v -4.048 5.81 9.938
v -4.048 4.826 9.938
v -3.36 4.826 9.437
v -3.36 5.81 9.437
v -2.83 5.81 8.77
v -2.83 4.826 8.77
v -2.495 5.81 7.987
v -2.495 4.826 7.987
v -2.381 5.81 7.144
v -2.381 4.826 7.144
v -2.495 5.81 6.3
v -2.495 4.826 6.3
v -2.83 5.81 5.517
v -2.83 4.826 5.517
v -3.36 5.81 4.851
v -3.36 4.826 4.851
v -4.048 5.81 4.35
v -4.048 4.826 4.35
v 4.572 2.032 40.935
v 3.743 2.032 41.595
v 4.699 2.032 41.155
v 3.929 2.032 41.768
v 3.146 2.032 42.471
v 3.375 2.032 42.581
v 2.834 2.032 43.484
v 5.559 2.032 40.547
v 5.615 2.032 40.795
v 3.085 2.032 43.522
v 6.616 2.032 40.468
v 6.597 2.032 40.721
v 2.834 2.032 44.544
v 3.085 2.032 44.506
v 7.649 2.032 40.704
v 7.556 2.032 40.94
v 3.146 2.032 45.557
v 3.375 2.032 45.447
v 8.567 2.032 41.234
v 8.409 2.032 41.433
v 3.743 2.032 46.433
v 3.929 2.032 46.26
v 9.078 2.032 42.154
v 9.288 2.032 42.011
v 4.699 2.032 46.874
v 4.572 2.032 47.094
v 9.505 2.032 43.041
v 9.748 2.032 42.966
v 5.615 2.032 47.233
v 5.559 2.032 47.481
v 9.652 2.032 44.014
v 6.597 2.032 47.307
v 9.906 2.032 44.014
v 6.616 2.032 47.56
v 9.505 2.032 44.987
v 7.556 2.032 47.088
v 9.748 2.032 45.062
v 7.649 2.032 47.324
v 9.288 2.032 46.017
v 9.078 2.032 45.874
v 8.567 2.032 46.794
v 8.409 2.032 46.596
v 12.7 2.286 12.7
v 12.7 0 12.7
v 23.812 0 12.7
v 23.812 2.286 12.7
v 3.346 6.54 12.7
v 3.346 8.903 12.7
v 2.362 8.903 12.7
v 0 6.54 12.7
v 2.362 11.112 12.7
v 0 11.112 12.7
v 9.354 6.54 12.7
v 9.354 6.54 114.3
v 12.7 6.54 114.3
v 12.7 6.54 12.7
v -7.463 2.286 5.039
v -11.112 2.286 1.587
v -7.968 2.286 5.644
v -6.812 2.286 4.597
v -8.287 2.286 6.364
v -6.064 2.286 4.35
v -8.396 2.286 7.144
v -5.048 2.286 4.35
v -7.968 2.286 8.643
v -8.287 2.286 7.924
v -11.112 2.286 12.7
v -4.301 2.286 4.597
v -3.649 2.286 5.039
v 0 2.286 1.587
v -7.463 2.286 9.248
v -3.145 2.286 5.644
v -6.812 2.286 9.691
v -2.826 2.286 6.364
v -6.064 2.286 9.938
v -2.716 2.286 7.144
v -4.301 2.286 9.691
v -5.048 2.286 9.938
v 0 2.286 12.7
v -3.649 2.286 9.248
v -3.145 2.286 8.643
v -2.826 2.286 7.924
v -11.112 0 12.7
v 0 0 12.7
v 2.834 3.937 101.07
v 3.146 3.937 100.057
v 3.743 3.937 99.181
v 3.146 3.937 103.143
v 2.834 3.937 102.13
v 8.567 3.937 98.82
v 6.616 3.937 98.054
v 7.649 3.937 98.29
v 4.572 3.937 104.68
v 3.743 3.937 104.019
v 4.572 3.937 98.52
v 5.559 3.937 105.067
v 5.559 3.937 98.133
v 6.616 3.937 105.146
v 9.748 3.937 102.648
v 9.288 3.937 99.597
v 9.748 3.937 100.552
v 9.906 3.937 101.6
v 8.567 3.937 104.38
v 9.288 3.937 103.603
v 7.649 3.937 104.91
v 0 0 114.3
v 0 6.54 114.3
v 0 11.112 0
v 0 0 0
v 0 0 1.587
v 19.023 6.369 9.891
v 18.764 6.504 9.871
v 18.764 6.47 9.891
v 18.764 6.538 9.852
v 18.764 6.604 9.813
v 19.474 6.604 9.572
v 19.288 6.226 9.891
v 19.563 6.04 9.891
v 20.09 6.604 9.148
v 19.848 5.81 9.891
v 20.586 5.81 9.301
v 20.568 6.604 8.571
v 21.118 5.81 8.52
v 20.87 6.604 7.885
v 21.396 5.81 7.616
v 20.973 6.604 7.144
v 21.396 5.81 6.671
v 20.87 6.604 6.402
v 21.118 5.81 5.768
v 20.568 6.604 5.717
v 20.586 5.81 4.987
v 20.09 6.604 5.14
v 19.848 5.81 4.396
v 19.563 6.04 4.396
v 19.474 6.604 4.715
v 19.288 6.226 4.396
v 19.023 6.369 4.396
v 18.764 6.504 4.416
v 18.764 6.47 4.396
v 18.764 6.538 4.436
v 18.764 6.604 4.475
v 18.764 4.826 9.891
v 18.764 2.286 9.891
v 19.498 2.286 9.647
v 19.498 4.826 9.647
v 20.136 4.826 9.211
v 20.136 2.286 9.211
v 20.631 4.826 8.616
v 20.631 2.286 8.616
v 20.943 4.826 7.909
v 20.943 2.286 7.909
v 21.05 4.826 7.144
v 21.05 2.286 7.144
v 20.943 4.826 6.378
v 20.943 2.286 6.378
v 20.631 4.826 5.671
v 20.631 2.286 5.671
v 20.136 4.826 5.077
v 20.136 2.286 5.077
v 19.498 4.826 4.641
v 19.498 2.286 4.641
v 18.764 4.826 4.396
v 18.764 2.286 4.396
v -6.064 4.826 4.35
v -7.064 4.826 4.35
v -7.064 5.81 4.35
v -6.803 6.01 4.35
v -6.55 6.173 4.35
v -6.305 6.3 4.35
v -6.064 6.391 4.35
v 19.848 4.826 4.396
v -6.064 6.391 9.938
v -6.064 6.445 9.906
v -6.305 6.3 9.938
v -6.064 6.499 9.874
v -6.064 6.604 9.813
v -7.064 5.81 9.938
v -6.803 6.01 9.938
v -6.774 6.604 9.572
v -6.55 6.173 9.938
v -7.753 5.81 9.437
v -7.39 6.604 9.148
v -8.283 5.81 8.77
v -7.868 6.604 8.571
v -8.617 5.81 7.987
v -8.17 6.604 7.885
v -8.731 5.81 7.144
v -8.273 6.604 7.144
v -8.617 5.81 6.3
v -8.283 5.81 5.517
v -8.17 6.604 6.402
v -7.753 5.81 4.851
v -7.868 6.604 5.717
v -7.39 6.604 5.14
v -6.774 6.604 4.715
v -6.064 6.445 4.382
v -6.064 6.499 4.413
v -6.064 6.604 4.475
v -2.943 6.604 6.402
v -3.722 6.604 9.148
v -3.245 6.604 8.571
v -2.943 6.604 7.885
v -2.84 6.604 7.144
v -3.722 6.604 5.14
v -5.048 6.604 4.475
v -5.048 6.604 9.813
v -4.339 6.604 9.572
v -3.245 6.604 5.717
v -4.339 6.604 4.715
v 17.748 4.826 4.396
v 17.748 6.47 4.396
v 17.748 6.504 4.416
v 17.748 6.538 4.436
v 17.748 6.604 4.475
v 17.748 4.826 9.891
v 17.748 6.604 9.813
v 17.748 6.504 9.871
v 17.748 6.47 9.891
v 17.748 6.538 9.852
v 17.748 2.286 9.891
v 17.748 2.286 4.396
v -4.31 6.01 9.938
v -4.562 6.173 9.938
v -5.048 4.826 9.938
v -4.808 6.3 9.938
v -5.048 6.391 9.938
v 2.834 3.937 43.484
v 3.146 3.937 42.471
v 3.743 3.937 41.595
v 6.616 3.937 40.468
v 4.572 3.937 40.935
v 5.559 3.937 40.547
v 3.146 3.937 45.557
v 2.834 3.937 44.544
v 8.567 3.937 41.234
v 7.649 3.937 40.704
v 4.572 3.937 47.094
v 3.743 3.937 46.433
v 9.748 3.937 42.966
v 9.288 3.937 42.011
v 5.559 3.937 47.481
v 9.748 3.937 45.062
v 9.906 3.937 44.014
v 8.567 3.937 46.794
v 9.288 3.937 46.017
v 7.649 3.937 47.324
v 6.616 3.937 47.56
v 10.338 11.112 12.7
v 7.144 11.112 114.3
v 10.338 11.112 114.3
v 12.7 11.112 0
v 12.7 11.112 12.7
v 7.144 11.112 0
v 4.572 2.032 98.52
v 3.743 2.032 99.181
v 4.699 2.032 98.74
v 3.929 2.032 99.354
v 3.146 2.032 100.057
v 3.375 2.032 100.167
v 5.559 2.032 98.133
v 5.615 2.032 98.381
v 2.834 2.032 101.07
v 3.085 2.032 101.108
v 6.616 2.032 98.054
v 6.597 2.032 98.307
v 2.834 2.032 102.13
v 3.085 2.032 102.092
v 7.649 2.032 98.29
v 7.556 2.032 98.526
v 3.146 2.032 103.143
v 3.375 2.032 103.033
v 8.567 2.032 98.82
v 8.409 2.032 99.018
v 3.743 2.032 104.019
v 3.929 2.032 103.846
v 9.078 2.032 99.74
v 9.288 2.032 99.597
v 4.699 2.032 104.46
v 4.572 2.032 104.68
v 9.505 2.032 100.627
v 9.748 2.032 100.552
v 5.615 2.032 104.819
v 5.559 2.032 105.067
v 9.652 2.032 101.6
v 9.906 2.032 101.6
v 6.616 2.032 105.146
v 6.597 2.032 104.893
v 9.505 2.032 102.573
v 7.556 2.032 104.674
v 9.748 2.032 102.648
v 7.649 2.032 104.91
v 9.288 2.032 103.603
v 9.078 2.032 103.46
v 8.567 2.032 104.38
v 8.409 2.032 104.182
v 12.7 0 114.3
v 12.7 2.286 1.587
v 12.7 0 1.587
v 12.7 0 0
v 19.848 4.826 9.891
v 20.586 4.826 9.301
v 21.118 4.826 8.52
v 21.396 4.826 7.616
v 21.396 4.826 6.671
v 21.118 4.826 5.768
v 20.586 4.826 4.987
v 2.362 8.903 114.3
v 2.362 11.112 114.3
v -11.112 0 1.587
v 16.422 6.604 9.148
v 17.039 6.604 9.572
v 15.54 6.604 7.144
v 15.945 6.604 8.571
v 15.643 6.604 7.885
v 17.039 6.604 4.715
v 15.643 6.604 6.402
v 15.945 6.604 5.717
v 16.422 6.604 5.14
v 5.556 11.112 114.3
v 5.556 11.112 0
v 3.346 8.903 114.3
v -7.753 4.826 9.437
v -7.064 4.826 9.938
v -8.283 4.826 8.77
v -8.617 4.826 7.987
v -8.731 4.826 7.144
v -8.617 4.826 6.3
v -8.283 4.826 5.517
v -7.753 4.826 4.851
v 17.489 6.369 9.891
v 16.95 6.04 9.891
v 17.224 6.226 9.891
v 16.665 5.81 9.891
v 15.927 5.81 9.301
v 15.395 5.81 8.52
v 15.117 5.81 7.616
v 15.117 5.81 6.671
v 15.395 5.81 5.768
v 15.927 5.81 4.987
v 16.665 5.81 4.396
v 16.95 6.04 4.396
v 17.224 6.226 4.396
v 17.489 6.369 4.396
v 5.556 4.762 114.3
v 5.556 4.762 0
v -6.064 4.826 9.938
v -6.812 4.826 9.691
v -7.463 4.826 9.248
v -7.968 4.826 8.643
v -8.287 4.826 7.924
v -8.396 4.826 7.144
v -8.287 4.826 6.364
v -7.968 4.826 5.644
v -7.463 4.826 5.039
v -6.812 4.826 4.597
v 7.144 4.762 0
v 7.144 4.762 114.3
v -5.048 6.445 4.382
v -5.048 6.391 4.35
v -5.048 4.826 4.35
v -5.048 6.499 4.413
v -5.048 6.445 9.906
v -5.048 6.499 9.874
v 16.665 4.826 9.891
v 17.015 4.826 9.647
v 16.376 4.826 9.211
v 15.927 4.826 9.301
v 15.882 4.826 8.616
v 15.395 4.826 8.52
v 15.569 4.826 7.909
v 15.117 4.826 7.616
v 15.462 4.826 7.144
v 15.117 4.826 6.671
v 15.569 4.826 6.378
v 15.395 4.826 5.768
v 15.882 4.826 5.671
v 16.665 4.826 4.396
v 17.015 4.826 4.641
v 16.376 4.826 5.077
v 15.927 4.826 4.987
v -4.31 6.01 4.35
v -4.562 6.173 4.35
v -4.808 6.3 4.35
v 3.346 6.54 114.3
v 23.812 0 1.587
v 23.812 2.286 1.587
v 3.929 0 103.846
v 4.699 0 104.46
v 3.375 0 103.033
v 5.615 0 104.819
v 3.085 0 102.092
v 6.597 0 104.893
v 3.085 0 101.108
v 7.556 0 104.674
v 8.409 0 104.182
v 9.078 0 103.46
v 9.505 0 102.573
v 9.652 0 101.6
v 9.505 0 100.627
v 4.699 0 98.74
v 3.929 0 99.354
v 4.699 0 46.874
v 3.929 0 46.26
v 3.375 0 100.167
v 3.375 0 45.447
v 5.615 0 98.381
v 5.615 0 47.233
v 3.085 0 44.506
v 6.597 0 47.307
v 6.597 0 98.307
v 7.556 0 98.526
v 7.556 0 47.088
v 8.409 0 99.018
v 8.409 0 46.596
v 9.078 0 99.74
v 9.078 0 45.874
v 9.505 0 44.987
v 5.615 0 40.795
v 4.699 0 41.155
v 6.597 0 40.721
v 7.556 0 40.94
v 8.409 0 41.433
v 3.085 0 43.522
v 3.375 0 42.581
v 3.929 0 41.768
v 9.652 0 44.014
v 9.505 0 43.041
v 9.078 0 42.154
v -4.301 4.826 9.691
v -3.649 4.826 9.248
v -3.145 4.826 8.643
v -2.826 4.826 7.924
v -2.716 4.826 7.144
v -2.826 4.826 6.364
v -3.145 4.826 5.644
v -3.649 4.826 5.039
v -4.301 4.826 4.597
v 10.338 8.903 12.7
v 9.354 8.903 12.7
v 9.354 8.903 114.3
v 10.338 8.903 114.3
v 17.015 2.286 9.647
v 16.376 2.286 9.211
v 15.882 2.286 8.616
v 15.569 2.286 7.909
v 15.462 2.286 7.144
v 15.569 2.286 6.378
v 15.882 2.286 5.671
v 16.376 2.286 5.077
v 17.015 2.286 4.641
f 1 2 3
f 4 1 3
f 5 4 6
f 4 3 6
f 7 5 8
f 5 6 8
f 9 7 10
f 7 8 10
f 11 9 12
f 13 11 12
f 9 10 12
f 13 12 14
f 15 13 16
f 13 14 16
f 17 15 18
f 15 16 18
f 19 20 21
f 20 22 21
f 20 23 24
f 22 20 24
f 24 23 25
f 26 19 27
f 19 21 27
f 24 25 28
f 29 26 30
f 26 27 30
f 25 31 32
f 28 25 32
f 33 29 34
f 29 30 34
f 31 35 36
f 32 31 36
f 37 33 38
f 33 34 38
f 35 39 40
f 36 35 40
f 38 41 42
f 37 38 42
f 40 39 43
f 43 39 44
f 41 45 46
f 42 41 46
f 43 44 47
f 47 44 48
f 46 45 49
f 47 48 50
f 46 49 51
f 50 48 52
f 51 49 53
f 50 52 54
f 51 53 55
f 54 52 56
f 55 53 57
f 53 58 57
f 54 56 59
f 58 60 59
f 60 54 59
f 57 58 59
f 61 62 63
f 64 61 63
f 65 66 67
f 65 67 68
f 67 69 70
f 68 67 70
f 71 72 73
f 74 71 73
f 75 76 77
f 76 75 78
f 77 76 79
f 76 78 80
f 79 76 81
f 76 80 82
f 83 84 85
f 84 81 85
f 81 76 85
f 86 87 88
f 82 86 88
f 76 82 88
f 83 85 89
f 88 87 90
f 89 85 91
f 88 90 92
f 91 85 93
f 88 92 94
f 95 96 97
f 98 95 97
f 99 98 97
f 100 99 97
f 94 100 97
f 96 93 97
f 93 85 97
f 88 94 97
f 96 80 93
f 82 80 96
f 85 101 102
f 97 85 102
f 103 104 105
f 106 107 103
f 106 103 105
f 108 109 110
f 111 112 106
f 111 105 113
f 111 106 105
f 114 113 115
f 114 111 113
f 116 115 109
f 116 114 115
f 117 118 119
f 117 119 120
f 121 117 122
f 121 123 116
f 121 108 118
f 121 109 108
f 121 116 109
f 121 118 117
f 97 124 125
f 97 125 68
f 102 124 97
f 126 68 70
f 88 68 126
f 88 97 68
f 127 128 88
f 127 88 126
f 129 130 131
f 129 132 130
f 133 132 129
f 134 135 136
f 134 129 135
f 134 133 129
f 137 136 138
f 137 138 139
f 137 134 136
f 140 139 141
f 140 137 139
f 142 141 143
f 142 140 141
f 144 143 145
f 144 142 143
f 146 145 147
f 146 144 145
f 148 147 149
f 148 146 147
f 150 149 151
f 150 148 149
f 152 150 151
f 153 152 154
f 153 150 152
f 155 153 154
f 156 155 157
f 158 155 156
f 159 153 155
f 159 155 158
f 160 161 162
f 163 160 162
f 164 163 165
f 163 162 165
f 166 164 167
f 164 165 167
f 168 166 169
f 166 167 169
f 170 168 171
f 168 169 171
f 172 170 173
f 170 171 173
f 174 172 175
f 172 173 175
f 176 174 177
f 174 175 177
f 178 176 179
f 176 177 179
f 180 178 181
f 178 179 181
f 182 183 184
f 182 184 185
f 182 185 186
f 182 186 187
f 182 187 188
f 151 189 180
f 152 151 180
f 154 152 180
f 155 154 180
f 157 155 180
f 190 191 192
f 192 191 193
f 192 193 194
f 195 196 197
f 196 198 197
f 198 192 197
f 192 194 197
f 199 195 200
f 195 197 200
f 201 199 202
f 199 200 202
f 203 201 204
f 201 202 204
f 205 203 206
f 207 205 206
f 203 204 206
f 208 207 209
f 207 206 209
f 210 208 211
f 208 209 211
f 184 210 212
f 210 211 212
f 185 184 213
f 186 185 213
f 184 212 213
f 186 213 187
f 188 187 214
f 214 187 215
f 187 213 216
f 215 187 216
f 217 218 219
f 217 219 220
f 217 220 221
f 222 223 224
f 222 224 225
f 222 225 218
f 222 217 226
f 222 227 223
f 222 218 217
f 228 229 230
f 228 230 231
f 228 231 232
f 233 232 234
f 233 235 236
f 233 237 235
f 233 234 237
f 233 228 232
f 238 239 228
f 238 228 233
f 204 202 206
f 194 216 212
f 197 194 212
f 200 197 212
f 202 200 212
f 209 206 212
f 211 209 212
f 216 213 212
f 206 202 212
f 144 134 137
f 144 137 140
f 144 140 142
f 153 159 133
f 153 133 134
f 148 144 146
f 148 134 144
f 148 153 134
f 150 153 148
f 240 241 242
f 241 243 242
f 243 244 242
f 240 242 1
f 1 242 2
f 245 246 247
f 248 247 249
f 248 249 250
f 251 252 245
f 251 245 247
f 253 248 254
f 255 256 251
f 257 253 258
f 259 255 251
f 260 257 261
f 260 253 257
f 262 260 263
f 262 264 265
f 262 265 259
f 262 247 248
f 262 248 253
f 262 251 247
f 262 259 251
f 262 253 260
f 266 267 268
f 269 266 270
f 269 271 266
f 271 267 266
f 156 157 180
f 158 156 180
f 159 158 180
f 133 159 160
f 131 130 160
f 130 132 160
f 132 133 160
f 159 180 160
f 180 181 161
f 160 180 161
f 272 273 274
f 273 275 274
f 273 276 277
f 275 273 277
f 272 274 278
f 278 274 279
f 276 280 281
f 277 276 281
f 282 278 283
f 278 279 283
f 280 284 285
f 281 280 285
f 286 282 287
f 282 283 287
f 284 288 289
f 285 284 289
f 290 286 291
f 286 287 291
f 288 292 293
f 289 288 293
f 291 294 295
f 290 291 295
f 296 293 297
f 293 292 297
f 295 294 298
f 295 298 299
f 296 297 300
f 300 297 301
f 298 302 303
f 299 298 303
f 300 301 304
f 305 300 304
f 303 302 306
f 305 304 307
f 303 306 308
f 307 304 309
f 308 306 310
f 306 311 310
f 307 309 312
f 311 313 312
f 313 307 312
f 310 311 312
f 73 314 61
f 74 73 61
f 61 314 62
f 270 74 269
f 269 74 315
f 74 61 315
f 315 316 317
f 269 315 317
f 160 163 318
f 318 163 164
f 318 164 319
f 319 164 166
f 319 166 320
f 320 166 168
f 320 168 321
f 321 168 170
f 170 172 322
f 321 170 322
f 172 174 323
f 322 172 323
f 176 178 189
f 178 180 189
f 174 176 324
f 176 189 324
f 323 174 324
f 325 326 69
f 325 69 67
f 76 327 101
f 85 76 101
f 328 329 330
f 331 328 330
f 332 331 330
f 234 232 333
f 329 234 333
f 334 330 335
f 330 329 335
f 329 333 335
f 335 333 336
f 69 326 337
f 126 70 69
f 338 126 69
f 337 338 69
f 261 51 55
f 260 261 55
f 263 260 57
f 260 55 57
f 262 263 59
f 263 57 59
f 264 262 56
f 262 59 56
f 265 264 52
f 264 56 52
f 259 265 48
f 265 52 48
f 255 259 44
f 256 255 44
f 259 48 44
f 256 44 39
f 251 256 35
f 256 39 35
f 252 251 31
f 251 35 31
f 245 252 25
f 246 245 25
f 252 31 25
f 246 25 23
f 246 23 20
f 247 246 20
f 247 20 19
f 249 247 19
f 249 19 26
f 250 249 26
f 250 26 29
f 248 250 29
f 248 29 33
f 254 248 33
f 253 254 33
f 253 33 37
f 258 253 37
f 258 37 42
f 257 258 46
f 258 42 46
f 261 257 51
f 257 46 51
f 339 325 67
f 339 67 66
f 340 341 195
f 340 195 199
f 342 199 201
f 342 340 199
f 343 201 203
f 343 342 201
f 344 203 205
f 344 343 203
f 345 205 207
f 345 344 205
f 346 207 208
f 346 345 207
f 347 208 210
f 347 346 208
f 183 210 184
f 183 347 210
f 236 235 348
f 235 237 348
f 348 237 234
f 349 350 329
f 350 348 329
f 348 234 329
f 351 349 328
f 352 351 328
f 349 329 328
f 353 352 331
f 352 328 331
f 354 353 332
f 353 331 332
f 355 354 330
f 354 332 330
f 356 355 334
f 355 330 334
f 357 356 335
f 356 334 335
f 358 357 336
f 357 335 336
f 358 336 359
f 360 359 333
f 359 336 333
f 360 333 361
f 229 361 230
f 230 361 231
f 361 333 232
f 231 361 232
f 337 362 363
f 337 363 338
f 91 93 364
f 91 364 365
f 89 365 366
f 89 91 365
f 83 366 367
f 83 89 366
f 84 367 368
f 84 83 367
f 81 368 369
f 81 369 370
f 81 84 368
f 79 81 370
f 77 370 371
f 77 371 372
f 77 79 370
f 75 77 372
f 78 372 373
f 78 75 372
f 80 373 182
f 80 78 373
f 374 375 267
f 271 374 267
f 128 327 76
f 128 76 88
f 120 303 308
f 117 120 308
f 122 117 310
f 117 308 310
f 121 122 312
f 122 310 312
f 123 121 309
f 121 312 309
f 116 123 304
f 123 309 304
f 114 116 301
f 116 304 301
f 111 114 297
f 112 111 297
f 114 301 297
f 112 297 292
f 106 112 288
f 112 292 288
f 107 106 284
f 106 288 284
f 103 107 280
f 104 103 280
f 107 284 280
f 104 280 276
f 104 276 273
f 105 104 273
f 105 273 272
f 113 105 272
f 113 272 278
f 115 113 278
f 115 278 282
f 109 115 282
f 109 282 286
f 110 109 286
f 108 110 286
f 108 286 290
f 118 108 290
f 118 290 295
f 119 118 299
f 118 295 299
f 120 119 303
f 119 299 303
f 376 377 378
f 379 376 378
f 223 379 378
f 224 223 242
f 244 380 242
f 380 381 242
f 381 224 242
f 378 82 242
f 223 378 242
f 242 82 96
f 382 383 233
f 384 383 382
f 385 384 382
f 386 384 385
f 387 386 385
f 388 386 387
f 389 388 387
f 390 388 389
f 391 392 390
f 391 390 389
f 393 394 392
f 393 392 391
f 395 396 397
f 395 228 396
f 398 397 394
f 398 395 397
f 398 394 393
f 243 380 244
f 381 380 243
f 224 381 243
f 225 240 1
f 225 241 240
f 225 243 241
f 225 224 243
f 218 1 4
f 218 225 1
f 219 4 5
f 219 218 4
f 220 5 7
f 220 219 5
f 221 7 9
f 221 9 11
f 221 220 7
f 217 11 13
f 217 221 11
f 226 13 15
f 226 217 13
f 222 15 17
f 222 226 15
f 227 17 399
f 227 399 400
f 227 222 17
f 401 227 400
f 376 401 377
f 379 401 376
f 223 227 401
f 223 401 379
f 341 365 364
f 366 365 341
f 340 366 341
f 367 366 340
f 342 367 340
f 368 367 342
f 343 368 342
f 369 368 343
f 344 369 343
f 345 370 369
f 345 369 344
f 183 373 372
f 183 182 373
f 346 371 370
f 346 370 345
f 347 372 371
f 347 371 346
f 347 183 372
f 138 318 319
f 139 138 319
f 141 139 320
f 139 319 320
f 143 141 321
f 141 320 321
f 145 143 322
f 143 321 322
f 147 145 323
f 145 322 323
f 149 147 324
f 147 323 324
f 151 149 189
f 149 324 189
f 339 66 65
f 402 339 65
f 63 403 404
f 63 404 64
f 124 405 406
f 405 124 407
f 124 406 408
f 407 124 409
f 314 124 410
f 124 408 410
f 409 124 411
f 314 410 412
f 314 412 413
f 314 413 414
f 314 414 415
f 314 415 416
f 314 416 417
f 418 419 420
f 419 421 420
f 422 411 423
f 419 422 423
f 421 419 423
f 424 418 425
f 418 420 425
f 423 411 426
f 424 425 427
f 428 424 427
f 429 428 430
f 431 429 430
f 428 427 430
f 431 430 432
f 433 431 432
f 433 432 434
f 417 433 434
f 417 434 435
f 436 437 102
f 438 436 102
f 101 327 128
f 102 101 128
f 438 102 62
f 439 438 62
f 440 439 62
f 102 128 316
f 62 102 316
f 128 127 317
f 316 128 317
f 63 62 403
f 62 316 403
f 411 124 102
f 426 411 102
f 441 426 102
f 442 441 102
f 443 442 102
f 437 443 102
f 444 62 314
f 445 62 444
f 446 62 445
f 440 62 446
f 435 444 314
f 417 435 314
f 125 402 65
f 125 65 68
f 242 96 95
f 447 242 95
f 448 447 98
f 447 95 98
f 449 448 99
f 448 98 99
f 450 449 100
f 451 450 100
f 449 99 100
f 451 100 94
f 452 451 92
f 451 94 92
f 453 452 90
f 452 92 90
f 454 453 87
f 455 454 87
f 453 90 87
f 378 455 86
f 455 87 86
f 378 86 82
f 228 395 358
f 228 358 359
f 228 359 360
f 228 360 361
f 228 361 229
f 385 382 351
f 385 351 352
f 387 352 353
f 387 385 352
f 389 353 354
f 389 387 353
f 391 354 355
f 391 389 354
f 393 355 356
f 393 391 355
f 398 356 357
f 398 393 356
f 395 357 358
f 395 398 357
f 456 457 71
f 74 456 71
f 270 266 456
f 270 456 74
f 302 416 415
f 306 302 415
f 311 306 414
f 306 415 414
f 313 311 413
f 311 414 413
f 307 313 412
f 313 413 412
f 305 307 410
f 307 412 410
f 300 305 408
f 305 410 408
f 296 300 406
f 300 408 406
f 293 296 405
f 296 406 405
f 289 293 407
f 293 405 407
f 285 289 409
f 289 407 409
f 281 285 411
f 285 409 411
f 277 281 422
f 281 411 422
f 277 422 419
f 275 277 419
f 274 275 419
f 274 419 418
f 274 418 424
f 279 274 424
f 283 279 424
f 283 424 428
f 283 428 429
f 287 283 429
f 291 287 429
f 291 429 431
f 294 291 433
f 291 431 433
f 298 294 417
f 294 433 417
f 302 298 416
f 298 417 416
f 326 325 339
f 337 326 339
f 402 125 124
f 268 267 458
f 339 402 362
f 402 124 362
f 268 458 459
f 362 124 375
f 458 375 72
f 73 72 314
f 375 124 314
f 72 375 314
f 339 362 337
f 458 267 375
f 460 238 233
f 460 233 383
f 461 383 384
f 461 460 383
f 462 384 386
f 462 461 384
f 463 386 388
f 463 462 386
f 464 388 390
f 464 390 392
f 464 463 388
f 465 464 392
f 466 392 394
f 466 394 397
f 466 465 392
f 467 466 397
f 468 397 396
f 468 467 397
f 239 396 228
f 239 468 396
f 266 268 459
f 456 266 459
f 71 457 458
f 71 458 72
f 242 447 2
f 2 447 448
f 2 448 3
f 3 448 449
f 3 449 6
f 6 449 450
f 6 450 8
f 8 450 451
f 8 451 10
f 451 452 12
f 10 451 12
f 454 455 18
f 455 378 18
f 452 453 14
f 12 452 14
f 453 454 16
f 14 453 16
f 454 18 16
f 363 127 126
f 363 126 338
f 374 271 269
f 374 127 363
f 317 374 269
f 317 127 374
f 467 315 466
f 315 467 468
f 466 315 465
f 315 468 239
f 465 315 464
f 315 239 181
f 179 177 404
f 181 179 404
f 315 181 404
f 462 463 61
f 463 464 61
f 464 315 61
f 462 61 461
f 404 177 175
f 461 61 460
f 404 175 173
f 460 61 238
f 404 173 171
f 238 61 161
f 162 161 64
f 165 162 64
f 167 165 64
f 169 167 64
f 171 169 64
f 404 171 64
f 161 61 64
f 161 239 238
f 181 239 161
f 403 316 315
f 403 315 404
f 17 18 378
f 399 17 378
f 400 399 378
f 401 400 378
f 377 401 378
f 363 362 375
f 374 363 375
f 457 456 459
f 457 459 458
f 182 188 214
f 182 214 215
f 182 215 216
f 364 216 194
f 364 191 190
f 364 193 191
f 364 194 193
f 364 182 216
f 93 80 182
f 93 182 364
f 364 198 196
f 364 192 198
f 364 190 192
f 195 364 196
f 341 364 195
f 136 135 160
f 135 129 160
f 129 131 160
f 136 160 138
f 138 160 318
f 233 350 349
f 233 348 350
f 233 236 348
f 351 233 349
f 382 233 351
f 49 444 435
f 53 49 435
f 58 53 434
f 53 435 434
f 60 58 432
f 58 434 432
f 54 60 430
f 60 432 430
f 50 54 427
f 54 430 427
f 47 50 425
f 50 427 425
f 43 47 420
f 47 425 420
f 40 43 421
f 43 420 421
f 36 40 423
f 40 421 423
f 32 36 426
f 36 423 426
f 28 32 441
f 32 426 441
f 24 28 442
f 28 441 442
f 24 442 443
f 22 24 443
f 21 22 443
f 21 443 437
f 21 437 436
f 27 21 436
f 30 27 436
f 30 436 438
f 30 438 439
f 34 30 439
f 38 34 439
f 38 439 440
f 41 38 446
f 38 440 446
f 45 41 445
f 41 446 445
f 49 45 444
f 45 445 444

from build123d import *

# Parameters (mm, degrees)
SKETCH1_W             = 12.7
SKETCH1_H             = 114.3
BOSS_EXTRUDE1_DEPTH   = 11.1125
SKETCH2_W             = 1.5875
SKETCH2_H             = 6.35
CUT_EXTRUDE1_DEPTH    = 115.3
CUT_EXTRUDE2_DEPTH    = 101.6
SKETCH4_W             = 11.1125
SKETCH4_H             = 11.1125
BOSS_EXTRUDE2_DEPTH   = 2.286
BOSS_EXTRUDE3_DEPTH   = 2.54
BOSS_EXTRUDE5_DEPTH   = 1.778
CHAMFER1_SIZE         = 0.79375
CHAMFER1_SIZE2        = 0.458271776
CHAMFER1_PART_2_SIZE  = 0.79375
CHAMFER1_PART_2_SIZE2 = 0.458271776
CHAMFER1_PART_3_SIZE  = 0.79375
CHAMFER1_PART_3_SIZE2 = 0.458271776
CHAMFER1_PART_4_SIZE  = 0.79375
CHAMFER1_PART_4_SIZE2 = 0.458271776
SKETCH7_R             = 3.302
CUT_EXTRUDE3_DEPTH    = 2.032
SKETCH8_R             = 3.556
CUT_EXTRUDE4_DEPTH    = 1.905


with BuildPart() as part:
    # Sketch1 → Boss-Extrude1 (new body)
    with BuildSketch(Plane(origin=(0, 0, 0), x_dir=(1, 0, 0), z_dir=(0, 1, 0))):
        with Locations((6.35, -57.15)):
            Rectangle(SKETCH1_W, SKETCH1_H)
    extrude(amount=BOSS_EXTRUDE1_DEPTH)

    # Sketch2 → Cut-Extrude1 (cut, through all)
    with BuildSketch(Plane.XY.offset(114.3)):
        with Locations((6.35, 7.9375)):
            Rectangle(SKETCH2_W, SKETCH2_H)
    extrude(amount=-CUT_EXTRUDE1_DEPTH, mode=Mode.SUBTRACT)

    # Sketch3 → Cut-Extrude2 (cut)
    with BuildSketch(Plane.XY.offset(114.3)):
        Polygon((2.3622, 11.1125), (2.3622, 8.9027), (3.34645, 8.9027), (3.34645, 6.5405), (0, 6.5405), (0, 11.1125), align=None)
        Polygon((10.3378, 11.1125), (10.3378, 8.9027), (9.35355, 8.9027), (9.35355, 6.5405), (12.7, 6.5405), (12.7, 11.1125), align=None)
    extrude(amount=-CUT_EXTRUDE2_DEPTH, mode=Mode.SUBTRACT)

    # Sketch4 → Boss-Extrude2 (add)
    with BuildSketch(Plane.XZ):
        with Locations((-5.55625, 7.14375)):
            Rectangle(SKETCH4_W, SKETCH4_H)
        with Locations((18.25625, 7.14375)):
            Rectangle(SKETCH4_W, SKETCH4_H)
    extrude(amount=-BOSS_EXTRUDE2_DEPTH)

    # Sketch5 → Boss-Extrude3 (add)
    with BuildSketch(Plane(origin=(0, 2.286, 0), x_dir=(1, 0, 0), z_dir=(0, 1, 0))):
        with BuildLine():
            Line((18.76425, -4.396319928), (18.76425, -9.891180072))
            ThreePointArc((18.76425, -9.891180072), (21.05025, -7.14375), (18.76425, -4.396319928))
        make_face()
        with BuildLine():
            Line((-6.06425, -4.34975), (-6.06425, -9.93775))
            ThreePointArc((-6.06425, -9.93775), (-8.396056331, -7.14375), (-6.06425, -4.34975))
        make_face()
        with BuildLine():
            Line((17.74825, -4.396319928), (17.74825, -9.891180072))
            ThreePointArc((17.74825, -9.891180072), (15.46225, -7.14375), (17.74825, -4.396319928))
        make_face()
        with BuildLine():
            Line((-5.04825, -4.34975), (-5.04825, -9.93775))
            ThreePointArc((-5.04825, -9.93775), (-2.716443669, -7.14375), (-5.04825, -4.34975))
        make_face()
    extrude(amount=BOSS_EXTRUDE3_DEPTH)

    # Sketch6 → Boss-Extrude5 (add)
    with BuildSketch(Plane(origin=(0, 4.826, 0), x_dir=(1, 0, 0), z_dir=(0, 1, 0))):
        with BuildLine():
            Line((-7.064291445, -4.34975), (-6.06425, -4.34975))
            Line((-6.06425, -4.34975), (-6.06425, -9.93775))
            Line((-6.06425, -9.93775), (-7.064291445, -9.93775))
            ThreePointArc((-7.064291445, -9.93775), (-8.73125, -7.14375), (-7.064291445, -4.34975))
        make_face()
        with BuildLine():
            Line((-4.048208555, -4.34975), (-5.04825, -4.34975))
            Line((-5.04825, -4.34975), (-5.04825, -9.93775))
            Line((-5.04825, -9.93775), (-4.048208555, -9.93775))
            ThreePointArc((-4.048208555, -9.93775), (-2.38125, -7.14375), (-4.048208555, -4.34975))
        make_face()
        with BuildLine():
            Line((16.664944561, -4.396319928), (17.74825, -4.396319928))
            Line((17.74825, -4.396319928), (17.74825, -9.891180072))
            Line((17.74825, -9.891180072), (16.664944561, -9.891180072))
            ThreePointArc((16.664944561, -9.891180072), (15.08125, -7.14375), (16.664944561, -4.396319928))
        make_face()
        with BuildLine():
            Line((19.847555439, -4.396319928), (18.76425, -4.396319928))
            Line((18.76425, -4.396319928), (18.76425, -9.891180072))
            Line((18.76425, -9.891180072), (19.847555439, -9.891180072))
            ThreePointArc((19.847555439, -9.891180072), (21.43125, -7.14375), (19.847555439, -4.396319928))
        make_face()
    extrude(amount=BOSS_EXTRUDE5_DEPTH)

    # Chamfer1
    chamfer1_edges = [part.edges().sort_by_distance(p)[0] for p in [
        (21.43125, 6.604, 7.14375),
    ]]
    chamfer1_side = [part.faces().sort_by_distance(p)[0] for p in [
        (21.43125, 5.715, 7.14375),
    ]]
    chamfer(chamfer1_edges, length=CHAMFER1_SIZE, length2=CHAMFER1_SIZE2, reference=chamfer1_side[0])

    # Chamfer1 part 2
    chamfer1_part_2_edges = [part.edges().sort_by_distance(p)[0] for p in [
        (15.08125, 6.604, 7.14375),
    ]]
    chamfer1_part_2_side = [part.faces().sort_by_distance(p)[0] for p in [
        (15.08125, 5.715, 7.14375),
    ]]
    chamfer(chamfer1_part_2_edges, length=CHAMFER1_PART_2_SIZE, length2=CHAMFER1_PART_2_SIZE2, reference=chamfer1_part_2_side[0])

    # Chamfer1 part 3
    chamfer1_part_3_edges = [part.edges().sort_by_distance(p)[0] for p in [
        (-2.38125, 6.604, 7.14375),
    ]]
    chamfer1_part_3_side = [part.faces().sort_by_distance(p)[0] for p in [
        (-2.38125, 5.715, 7.14375),
    ]]
    chamfer(chamfer1_part_3_edges, length=CHAMFER1_PART_3_SIZE, length2=CHAMFER1_PART_3_SIZE2, reference=chamfer1_part_3_side[0])

    # Chamfer1 part 4
    chamfer1_part_4_edges = [part.edges().sort_by_distance(p)[0] for p in [
        (-8.73125, 6.604, 7.14375),
    ]]
    chamfer1_part_4_side = [part.faces().sort_by_distance(p)[0] for p in [
        (-8.73125, 5.715, 7.14375),
    ]]
    chamfer(chamfer1_part_4_edges, length=CHAMFER1_PART_4_SIZE, length2=CHAMFER1_PART_4_SIZE2, reference=chamfer1_part_4_side[0])

    # Sketch7 → Cut-Extrude3 (cut)
    with BuildSketch(Plane.XZ):
        with Locations((6.35, 101.6)):
            Circle(SKETCH7_R)
        with Locations((6.35, 44.014136)):
            Circle(SKETCH7_R)
    extrude(amount=-CUT_EXTRUDE3_DEPTH, mode=Mode.SUBTRACT)

    # Sketch8 → Cut-Extrude4 (cut)
    with BuildSketch(Plane.XZ.offset(-2.032)):
        with Locations((6.35, 101.6)):
            Circle(SKETCH8_R)
        with Locations((6.35, 44.014136)):
            Circle(SKETCH8_R)
    extrude(amount=-CUT_EXTRUDE4_DEPTH, mode=Mode.SUBTRACT)


solid = part.part
